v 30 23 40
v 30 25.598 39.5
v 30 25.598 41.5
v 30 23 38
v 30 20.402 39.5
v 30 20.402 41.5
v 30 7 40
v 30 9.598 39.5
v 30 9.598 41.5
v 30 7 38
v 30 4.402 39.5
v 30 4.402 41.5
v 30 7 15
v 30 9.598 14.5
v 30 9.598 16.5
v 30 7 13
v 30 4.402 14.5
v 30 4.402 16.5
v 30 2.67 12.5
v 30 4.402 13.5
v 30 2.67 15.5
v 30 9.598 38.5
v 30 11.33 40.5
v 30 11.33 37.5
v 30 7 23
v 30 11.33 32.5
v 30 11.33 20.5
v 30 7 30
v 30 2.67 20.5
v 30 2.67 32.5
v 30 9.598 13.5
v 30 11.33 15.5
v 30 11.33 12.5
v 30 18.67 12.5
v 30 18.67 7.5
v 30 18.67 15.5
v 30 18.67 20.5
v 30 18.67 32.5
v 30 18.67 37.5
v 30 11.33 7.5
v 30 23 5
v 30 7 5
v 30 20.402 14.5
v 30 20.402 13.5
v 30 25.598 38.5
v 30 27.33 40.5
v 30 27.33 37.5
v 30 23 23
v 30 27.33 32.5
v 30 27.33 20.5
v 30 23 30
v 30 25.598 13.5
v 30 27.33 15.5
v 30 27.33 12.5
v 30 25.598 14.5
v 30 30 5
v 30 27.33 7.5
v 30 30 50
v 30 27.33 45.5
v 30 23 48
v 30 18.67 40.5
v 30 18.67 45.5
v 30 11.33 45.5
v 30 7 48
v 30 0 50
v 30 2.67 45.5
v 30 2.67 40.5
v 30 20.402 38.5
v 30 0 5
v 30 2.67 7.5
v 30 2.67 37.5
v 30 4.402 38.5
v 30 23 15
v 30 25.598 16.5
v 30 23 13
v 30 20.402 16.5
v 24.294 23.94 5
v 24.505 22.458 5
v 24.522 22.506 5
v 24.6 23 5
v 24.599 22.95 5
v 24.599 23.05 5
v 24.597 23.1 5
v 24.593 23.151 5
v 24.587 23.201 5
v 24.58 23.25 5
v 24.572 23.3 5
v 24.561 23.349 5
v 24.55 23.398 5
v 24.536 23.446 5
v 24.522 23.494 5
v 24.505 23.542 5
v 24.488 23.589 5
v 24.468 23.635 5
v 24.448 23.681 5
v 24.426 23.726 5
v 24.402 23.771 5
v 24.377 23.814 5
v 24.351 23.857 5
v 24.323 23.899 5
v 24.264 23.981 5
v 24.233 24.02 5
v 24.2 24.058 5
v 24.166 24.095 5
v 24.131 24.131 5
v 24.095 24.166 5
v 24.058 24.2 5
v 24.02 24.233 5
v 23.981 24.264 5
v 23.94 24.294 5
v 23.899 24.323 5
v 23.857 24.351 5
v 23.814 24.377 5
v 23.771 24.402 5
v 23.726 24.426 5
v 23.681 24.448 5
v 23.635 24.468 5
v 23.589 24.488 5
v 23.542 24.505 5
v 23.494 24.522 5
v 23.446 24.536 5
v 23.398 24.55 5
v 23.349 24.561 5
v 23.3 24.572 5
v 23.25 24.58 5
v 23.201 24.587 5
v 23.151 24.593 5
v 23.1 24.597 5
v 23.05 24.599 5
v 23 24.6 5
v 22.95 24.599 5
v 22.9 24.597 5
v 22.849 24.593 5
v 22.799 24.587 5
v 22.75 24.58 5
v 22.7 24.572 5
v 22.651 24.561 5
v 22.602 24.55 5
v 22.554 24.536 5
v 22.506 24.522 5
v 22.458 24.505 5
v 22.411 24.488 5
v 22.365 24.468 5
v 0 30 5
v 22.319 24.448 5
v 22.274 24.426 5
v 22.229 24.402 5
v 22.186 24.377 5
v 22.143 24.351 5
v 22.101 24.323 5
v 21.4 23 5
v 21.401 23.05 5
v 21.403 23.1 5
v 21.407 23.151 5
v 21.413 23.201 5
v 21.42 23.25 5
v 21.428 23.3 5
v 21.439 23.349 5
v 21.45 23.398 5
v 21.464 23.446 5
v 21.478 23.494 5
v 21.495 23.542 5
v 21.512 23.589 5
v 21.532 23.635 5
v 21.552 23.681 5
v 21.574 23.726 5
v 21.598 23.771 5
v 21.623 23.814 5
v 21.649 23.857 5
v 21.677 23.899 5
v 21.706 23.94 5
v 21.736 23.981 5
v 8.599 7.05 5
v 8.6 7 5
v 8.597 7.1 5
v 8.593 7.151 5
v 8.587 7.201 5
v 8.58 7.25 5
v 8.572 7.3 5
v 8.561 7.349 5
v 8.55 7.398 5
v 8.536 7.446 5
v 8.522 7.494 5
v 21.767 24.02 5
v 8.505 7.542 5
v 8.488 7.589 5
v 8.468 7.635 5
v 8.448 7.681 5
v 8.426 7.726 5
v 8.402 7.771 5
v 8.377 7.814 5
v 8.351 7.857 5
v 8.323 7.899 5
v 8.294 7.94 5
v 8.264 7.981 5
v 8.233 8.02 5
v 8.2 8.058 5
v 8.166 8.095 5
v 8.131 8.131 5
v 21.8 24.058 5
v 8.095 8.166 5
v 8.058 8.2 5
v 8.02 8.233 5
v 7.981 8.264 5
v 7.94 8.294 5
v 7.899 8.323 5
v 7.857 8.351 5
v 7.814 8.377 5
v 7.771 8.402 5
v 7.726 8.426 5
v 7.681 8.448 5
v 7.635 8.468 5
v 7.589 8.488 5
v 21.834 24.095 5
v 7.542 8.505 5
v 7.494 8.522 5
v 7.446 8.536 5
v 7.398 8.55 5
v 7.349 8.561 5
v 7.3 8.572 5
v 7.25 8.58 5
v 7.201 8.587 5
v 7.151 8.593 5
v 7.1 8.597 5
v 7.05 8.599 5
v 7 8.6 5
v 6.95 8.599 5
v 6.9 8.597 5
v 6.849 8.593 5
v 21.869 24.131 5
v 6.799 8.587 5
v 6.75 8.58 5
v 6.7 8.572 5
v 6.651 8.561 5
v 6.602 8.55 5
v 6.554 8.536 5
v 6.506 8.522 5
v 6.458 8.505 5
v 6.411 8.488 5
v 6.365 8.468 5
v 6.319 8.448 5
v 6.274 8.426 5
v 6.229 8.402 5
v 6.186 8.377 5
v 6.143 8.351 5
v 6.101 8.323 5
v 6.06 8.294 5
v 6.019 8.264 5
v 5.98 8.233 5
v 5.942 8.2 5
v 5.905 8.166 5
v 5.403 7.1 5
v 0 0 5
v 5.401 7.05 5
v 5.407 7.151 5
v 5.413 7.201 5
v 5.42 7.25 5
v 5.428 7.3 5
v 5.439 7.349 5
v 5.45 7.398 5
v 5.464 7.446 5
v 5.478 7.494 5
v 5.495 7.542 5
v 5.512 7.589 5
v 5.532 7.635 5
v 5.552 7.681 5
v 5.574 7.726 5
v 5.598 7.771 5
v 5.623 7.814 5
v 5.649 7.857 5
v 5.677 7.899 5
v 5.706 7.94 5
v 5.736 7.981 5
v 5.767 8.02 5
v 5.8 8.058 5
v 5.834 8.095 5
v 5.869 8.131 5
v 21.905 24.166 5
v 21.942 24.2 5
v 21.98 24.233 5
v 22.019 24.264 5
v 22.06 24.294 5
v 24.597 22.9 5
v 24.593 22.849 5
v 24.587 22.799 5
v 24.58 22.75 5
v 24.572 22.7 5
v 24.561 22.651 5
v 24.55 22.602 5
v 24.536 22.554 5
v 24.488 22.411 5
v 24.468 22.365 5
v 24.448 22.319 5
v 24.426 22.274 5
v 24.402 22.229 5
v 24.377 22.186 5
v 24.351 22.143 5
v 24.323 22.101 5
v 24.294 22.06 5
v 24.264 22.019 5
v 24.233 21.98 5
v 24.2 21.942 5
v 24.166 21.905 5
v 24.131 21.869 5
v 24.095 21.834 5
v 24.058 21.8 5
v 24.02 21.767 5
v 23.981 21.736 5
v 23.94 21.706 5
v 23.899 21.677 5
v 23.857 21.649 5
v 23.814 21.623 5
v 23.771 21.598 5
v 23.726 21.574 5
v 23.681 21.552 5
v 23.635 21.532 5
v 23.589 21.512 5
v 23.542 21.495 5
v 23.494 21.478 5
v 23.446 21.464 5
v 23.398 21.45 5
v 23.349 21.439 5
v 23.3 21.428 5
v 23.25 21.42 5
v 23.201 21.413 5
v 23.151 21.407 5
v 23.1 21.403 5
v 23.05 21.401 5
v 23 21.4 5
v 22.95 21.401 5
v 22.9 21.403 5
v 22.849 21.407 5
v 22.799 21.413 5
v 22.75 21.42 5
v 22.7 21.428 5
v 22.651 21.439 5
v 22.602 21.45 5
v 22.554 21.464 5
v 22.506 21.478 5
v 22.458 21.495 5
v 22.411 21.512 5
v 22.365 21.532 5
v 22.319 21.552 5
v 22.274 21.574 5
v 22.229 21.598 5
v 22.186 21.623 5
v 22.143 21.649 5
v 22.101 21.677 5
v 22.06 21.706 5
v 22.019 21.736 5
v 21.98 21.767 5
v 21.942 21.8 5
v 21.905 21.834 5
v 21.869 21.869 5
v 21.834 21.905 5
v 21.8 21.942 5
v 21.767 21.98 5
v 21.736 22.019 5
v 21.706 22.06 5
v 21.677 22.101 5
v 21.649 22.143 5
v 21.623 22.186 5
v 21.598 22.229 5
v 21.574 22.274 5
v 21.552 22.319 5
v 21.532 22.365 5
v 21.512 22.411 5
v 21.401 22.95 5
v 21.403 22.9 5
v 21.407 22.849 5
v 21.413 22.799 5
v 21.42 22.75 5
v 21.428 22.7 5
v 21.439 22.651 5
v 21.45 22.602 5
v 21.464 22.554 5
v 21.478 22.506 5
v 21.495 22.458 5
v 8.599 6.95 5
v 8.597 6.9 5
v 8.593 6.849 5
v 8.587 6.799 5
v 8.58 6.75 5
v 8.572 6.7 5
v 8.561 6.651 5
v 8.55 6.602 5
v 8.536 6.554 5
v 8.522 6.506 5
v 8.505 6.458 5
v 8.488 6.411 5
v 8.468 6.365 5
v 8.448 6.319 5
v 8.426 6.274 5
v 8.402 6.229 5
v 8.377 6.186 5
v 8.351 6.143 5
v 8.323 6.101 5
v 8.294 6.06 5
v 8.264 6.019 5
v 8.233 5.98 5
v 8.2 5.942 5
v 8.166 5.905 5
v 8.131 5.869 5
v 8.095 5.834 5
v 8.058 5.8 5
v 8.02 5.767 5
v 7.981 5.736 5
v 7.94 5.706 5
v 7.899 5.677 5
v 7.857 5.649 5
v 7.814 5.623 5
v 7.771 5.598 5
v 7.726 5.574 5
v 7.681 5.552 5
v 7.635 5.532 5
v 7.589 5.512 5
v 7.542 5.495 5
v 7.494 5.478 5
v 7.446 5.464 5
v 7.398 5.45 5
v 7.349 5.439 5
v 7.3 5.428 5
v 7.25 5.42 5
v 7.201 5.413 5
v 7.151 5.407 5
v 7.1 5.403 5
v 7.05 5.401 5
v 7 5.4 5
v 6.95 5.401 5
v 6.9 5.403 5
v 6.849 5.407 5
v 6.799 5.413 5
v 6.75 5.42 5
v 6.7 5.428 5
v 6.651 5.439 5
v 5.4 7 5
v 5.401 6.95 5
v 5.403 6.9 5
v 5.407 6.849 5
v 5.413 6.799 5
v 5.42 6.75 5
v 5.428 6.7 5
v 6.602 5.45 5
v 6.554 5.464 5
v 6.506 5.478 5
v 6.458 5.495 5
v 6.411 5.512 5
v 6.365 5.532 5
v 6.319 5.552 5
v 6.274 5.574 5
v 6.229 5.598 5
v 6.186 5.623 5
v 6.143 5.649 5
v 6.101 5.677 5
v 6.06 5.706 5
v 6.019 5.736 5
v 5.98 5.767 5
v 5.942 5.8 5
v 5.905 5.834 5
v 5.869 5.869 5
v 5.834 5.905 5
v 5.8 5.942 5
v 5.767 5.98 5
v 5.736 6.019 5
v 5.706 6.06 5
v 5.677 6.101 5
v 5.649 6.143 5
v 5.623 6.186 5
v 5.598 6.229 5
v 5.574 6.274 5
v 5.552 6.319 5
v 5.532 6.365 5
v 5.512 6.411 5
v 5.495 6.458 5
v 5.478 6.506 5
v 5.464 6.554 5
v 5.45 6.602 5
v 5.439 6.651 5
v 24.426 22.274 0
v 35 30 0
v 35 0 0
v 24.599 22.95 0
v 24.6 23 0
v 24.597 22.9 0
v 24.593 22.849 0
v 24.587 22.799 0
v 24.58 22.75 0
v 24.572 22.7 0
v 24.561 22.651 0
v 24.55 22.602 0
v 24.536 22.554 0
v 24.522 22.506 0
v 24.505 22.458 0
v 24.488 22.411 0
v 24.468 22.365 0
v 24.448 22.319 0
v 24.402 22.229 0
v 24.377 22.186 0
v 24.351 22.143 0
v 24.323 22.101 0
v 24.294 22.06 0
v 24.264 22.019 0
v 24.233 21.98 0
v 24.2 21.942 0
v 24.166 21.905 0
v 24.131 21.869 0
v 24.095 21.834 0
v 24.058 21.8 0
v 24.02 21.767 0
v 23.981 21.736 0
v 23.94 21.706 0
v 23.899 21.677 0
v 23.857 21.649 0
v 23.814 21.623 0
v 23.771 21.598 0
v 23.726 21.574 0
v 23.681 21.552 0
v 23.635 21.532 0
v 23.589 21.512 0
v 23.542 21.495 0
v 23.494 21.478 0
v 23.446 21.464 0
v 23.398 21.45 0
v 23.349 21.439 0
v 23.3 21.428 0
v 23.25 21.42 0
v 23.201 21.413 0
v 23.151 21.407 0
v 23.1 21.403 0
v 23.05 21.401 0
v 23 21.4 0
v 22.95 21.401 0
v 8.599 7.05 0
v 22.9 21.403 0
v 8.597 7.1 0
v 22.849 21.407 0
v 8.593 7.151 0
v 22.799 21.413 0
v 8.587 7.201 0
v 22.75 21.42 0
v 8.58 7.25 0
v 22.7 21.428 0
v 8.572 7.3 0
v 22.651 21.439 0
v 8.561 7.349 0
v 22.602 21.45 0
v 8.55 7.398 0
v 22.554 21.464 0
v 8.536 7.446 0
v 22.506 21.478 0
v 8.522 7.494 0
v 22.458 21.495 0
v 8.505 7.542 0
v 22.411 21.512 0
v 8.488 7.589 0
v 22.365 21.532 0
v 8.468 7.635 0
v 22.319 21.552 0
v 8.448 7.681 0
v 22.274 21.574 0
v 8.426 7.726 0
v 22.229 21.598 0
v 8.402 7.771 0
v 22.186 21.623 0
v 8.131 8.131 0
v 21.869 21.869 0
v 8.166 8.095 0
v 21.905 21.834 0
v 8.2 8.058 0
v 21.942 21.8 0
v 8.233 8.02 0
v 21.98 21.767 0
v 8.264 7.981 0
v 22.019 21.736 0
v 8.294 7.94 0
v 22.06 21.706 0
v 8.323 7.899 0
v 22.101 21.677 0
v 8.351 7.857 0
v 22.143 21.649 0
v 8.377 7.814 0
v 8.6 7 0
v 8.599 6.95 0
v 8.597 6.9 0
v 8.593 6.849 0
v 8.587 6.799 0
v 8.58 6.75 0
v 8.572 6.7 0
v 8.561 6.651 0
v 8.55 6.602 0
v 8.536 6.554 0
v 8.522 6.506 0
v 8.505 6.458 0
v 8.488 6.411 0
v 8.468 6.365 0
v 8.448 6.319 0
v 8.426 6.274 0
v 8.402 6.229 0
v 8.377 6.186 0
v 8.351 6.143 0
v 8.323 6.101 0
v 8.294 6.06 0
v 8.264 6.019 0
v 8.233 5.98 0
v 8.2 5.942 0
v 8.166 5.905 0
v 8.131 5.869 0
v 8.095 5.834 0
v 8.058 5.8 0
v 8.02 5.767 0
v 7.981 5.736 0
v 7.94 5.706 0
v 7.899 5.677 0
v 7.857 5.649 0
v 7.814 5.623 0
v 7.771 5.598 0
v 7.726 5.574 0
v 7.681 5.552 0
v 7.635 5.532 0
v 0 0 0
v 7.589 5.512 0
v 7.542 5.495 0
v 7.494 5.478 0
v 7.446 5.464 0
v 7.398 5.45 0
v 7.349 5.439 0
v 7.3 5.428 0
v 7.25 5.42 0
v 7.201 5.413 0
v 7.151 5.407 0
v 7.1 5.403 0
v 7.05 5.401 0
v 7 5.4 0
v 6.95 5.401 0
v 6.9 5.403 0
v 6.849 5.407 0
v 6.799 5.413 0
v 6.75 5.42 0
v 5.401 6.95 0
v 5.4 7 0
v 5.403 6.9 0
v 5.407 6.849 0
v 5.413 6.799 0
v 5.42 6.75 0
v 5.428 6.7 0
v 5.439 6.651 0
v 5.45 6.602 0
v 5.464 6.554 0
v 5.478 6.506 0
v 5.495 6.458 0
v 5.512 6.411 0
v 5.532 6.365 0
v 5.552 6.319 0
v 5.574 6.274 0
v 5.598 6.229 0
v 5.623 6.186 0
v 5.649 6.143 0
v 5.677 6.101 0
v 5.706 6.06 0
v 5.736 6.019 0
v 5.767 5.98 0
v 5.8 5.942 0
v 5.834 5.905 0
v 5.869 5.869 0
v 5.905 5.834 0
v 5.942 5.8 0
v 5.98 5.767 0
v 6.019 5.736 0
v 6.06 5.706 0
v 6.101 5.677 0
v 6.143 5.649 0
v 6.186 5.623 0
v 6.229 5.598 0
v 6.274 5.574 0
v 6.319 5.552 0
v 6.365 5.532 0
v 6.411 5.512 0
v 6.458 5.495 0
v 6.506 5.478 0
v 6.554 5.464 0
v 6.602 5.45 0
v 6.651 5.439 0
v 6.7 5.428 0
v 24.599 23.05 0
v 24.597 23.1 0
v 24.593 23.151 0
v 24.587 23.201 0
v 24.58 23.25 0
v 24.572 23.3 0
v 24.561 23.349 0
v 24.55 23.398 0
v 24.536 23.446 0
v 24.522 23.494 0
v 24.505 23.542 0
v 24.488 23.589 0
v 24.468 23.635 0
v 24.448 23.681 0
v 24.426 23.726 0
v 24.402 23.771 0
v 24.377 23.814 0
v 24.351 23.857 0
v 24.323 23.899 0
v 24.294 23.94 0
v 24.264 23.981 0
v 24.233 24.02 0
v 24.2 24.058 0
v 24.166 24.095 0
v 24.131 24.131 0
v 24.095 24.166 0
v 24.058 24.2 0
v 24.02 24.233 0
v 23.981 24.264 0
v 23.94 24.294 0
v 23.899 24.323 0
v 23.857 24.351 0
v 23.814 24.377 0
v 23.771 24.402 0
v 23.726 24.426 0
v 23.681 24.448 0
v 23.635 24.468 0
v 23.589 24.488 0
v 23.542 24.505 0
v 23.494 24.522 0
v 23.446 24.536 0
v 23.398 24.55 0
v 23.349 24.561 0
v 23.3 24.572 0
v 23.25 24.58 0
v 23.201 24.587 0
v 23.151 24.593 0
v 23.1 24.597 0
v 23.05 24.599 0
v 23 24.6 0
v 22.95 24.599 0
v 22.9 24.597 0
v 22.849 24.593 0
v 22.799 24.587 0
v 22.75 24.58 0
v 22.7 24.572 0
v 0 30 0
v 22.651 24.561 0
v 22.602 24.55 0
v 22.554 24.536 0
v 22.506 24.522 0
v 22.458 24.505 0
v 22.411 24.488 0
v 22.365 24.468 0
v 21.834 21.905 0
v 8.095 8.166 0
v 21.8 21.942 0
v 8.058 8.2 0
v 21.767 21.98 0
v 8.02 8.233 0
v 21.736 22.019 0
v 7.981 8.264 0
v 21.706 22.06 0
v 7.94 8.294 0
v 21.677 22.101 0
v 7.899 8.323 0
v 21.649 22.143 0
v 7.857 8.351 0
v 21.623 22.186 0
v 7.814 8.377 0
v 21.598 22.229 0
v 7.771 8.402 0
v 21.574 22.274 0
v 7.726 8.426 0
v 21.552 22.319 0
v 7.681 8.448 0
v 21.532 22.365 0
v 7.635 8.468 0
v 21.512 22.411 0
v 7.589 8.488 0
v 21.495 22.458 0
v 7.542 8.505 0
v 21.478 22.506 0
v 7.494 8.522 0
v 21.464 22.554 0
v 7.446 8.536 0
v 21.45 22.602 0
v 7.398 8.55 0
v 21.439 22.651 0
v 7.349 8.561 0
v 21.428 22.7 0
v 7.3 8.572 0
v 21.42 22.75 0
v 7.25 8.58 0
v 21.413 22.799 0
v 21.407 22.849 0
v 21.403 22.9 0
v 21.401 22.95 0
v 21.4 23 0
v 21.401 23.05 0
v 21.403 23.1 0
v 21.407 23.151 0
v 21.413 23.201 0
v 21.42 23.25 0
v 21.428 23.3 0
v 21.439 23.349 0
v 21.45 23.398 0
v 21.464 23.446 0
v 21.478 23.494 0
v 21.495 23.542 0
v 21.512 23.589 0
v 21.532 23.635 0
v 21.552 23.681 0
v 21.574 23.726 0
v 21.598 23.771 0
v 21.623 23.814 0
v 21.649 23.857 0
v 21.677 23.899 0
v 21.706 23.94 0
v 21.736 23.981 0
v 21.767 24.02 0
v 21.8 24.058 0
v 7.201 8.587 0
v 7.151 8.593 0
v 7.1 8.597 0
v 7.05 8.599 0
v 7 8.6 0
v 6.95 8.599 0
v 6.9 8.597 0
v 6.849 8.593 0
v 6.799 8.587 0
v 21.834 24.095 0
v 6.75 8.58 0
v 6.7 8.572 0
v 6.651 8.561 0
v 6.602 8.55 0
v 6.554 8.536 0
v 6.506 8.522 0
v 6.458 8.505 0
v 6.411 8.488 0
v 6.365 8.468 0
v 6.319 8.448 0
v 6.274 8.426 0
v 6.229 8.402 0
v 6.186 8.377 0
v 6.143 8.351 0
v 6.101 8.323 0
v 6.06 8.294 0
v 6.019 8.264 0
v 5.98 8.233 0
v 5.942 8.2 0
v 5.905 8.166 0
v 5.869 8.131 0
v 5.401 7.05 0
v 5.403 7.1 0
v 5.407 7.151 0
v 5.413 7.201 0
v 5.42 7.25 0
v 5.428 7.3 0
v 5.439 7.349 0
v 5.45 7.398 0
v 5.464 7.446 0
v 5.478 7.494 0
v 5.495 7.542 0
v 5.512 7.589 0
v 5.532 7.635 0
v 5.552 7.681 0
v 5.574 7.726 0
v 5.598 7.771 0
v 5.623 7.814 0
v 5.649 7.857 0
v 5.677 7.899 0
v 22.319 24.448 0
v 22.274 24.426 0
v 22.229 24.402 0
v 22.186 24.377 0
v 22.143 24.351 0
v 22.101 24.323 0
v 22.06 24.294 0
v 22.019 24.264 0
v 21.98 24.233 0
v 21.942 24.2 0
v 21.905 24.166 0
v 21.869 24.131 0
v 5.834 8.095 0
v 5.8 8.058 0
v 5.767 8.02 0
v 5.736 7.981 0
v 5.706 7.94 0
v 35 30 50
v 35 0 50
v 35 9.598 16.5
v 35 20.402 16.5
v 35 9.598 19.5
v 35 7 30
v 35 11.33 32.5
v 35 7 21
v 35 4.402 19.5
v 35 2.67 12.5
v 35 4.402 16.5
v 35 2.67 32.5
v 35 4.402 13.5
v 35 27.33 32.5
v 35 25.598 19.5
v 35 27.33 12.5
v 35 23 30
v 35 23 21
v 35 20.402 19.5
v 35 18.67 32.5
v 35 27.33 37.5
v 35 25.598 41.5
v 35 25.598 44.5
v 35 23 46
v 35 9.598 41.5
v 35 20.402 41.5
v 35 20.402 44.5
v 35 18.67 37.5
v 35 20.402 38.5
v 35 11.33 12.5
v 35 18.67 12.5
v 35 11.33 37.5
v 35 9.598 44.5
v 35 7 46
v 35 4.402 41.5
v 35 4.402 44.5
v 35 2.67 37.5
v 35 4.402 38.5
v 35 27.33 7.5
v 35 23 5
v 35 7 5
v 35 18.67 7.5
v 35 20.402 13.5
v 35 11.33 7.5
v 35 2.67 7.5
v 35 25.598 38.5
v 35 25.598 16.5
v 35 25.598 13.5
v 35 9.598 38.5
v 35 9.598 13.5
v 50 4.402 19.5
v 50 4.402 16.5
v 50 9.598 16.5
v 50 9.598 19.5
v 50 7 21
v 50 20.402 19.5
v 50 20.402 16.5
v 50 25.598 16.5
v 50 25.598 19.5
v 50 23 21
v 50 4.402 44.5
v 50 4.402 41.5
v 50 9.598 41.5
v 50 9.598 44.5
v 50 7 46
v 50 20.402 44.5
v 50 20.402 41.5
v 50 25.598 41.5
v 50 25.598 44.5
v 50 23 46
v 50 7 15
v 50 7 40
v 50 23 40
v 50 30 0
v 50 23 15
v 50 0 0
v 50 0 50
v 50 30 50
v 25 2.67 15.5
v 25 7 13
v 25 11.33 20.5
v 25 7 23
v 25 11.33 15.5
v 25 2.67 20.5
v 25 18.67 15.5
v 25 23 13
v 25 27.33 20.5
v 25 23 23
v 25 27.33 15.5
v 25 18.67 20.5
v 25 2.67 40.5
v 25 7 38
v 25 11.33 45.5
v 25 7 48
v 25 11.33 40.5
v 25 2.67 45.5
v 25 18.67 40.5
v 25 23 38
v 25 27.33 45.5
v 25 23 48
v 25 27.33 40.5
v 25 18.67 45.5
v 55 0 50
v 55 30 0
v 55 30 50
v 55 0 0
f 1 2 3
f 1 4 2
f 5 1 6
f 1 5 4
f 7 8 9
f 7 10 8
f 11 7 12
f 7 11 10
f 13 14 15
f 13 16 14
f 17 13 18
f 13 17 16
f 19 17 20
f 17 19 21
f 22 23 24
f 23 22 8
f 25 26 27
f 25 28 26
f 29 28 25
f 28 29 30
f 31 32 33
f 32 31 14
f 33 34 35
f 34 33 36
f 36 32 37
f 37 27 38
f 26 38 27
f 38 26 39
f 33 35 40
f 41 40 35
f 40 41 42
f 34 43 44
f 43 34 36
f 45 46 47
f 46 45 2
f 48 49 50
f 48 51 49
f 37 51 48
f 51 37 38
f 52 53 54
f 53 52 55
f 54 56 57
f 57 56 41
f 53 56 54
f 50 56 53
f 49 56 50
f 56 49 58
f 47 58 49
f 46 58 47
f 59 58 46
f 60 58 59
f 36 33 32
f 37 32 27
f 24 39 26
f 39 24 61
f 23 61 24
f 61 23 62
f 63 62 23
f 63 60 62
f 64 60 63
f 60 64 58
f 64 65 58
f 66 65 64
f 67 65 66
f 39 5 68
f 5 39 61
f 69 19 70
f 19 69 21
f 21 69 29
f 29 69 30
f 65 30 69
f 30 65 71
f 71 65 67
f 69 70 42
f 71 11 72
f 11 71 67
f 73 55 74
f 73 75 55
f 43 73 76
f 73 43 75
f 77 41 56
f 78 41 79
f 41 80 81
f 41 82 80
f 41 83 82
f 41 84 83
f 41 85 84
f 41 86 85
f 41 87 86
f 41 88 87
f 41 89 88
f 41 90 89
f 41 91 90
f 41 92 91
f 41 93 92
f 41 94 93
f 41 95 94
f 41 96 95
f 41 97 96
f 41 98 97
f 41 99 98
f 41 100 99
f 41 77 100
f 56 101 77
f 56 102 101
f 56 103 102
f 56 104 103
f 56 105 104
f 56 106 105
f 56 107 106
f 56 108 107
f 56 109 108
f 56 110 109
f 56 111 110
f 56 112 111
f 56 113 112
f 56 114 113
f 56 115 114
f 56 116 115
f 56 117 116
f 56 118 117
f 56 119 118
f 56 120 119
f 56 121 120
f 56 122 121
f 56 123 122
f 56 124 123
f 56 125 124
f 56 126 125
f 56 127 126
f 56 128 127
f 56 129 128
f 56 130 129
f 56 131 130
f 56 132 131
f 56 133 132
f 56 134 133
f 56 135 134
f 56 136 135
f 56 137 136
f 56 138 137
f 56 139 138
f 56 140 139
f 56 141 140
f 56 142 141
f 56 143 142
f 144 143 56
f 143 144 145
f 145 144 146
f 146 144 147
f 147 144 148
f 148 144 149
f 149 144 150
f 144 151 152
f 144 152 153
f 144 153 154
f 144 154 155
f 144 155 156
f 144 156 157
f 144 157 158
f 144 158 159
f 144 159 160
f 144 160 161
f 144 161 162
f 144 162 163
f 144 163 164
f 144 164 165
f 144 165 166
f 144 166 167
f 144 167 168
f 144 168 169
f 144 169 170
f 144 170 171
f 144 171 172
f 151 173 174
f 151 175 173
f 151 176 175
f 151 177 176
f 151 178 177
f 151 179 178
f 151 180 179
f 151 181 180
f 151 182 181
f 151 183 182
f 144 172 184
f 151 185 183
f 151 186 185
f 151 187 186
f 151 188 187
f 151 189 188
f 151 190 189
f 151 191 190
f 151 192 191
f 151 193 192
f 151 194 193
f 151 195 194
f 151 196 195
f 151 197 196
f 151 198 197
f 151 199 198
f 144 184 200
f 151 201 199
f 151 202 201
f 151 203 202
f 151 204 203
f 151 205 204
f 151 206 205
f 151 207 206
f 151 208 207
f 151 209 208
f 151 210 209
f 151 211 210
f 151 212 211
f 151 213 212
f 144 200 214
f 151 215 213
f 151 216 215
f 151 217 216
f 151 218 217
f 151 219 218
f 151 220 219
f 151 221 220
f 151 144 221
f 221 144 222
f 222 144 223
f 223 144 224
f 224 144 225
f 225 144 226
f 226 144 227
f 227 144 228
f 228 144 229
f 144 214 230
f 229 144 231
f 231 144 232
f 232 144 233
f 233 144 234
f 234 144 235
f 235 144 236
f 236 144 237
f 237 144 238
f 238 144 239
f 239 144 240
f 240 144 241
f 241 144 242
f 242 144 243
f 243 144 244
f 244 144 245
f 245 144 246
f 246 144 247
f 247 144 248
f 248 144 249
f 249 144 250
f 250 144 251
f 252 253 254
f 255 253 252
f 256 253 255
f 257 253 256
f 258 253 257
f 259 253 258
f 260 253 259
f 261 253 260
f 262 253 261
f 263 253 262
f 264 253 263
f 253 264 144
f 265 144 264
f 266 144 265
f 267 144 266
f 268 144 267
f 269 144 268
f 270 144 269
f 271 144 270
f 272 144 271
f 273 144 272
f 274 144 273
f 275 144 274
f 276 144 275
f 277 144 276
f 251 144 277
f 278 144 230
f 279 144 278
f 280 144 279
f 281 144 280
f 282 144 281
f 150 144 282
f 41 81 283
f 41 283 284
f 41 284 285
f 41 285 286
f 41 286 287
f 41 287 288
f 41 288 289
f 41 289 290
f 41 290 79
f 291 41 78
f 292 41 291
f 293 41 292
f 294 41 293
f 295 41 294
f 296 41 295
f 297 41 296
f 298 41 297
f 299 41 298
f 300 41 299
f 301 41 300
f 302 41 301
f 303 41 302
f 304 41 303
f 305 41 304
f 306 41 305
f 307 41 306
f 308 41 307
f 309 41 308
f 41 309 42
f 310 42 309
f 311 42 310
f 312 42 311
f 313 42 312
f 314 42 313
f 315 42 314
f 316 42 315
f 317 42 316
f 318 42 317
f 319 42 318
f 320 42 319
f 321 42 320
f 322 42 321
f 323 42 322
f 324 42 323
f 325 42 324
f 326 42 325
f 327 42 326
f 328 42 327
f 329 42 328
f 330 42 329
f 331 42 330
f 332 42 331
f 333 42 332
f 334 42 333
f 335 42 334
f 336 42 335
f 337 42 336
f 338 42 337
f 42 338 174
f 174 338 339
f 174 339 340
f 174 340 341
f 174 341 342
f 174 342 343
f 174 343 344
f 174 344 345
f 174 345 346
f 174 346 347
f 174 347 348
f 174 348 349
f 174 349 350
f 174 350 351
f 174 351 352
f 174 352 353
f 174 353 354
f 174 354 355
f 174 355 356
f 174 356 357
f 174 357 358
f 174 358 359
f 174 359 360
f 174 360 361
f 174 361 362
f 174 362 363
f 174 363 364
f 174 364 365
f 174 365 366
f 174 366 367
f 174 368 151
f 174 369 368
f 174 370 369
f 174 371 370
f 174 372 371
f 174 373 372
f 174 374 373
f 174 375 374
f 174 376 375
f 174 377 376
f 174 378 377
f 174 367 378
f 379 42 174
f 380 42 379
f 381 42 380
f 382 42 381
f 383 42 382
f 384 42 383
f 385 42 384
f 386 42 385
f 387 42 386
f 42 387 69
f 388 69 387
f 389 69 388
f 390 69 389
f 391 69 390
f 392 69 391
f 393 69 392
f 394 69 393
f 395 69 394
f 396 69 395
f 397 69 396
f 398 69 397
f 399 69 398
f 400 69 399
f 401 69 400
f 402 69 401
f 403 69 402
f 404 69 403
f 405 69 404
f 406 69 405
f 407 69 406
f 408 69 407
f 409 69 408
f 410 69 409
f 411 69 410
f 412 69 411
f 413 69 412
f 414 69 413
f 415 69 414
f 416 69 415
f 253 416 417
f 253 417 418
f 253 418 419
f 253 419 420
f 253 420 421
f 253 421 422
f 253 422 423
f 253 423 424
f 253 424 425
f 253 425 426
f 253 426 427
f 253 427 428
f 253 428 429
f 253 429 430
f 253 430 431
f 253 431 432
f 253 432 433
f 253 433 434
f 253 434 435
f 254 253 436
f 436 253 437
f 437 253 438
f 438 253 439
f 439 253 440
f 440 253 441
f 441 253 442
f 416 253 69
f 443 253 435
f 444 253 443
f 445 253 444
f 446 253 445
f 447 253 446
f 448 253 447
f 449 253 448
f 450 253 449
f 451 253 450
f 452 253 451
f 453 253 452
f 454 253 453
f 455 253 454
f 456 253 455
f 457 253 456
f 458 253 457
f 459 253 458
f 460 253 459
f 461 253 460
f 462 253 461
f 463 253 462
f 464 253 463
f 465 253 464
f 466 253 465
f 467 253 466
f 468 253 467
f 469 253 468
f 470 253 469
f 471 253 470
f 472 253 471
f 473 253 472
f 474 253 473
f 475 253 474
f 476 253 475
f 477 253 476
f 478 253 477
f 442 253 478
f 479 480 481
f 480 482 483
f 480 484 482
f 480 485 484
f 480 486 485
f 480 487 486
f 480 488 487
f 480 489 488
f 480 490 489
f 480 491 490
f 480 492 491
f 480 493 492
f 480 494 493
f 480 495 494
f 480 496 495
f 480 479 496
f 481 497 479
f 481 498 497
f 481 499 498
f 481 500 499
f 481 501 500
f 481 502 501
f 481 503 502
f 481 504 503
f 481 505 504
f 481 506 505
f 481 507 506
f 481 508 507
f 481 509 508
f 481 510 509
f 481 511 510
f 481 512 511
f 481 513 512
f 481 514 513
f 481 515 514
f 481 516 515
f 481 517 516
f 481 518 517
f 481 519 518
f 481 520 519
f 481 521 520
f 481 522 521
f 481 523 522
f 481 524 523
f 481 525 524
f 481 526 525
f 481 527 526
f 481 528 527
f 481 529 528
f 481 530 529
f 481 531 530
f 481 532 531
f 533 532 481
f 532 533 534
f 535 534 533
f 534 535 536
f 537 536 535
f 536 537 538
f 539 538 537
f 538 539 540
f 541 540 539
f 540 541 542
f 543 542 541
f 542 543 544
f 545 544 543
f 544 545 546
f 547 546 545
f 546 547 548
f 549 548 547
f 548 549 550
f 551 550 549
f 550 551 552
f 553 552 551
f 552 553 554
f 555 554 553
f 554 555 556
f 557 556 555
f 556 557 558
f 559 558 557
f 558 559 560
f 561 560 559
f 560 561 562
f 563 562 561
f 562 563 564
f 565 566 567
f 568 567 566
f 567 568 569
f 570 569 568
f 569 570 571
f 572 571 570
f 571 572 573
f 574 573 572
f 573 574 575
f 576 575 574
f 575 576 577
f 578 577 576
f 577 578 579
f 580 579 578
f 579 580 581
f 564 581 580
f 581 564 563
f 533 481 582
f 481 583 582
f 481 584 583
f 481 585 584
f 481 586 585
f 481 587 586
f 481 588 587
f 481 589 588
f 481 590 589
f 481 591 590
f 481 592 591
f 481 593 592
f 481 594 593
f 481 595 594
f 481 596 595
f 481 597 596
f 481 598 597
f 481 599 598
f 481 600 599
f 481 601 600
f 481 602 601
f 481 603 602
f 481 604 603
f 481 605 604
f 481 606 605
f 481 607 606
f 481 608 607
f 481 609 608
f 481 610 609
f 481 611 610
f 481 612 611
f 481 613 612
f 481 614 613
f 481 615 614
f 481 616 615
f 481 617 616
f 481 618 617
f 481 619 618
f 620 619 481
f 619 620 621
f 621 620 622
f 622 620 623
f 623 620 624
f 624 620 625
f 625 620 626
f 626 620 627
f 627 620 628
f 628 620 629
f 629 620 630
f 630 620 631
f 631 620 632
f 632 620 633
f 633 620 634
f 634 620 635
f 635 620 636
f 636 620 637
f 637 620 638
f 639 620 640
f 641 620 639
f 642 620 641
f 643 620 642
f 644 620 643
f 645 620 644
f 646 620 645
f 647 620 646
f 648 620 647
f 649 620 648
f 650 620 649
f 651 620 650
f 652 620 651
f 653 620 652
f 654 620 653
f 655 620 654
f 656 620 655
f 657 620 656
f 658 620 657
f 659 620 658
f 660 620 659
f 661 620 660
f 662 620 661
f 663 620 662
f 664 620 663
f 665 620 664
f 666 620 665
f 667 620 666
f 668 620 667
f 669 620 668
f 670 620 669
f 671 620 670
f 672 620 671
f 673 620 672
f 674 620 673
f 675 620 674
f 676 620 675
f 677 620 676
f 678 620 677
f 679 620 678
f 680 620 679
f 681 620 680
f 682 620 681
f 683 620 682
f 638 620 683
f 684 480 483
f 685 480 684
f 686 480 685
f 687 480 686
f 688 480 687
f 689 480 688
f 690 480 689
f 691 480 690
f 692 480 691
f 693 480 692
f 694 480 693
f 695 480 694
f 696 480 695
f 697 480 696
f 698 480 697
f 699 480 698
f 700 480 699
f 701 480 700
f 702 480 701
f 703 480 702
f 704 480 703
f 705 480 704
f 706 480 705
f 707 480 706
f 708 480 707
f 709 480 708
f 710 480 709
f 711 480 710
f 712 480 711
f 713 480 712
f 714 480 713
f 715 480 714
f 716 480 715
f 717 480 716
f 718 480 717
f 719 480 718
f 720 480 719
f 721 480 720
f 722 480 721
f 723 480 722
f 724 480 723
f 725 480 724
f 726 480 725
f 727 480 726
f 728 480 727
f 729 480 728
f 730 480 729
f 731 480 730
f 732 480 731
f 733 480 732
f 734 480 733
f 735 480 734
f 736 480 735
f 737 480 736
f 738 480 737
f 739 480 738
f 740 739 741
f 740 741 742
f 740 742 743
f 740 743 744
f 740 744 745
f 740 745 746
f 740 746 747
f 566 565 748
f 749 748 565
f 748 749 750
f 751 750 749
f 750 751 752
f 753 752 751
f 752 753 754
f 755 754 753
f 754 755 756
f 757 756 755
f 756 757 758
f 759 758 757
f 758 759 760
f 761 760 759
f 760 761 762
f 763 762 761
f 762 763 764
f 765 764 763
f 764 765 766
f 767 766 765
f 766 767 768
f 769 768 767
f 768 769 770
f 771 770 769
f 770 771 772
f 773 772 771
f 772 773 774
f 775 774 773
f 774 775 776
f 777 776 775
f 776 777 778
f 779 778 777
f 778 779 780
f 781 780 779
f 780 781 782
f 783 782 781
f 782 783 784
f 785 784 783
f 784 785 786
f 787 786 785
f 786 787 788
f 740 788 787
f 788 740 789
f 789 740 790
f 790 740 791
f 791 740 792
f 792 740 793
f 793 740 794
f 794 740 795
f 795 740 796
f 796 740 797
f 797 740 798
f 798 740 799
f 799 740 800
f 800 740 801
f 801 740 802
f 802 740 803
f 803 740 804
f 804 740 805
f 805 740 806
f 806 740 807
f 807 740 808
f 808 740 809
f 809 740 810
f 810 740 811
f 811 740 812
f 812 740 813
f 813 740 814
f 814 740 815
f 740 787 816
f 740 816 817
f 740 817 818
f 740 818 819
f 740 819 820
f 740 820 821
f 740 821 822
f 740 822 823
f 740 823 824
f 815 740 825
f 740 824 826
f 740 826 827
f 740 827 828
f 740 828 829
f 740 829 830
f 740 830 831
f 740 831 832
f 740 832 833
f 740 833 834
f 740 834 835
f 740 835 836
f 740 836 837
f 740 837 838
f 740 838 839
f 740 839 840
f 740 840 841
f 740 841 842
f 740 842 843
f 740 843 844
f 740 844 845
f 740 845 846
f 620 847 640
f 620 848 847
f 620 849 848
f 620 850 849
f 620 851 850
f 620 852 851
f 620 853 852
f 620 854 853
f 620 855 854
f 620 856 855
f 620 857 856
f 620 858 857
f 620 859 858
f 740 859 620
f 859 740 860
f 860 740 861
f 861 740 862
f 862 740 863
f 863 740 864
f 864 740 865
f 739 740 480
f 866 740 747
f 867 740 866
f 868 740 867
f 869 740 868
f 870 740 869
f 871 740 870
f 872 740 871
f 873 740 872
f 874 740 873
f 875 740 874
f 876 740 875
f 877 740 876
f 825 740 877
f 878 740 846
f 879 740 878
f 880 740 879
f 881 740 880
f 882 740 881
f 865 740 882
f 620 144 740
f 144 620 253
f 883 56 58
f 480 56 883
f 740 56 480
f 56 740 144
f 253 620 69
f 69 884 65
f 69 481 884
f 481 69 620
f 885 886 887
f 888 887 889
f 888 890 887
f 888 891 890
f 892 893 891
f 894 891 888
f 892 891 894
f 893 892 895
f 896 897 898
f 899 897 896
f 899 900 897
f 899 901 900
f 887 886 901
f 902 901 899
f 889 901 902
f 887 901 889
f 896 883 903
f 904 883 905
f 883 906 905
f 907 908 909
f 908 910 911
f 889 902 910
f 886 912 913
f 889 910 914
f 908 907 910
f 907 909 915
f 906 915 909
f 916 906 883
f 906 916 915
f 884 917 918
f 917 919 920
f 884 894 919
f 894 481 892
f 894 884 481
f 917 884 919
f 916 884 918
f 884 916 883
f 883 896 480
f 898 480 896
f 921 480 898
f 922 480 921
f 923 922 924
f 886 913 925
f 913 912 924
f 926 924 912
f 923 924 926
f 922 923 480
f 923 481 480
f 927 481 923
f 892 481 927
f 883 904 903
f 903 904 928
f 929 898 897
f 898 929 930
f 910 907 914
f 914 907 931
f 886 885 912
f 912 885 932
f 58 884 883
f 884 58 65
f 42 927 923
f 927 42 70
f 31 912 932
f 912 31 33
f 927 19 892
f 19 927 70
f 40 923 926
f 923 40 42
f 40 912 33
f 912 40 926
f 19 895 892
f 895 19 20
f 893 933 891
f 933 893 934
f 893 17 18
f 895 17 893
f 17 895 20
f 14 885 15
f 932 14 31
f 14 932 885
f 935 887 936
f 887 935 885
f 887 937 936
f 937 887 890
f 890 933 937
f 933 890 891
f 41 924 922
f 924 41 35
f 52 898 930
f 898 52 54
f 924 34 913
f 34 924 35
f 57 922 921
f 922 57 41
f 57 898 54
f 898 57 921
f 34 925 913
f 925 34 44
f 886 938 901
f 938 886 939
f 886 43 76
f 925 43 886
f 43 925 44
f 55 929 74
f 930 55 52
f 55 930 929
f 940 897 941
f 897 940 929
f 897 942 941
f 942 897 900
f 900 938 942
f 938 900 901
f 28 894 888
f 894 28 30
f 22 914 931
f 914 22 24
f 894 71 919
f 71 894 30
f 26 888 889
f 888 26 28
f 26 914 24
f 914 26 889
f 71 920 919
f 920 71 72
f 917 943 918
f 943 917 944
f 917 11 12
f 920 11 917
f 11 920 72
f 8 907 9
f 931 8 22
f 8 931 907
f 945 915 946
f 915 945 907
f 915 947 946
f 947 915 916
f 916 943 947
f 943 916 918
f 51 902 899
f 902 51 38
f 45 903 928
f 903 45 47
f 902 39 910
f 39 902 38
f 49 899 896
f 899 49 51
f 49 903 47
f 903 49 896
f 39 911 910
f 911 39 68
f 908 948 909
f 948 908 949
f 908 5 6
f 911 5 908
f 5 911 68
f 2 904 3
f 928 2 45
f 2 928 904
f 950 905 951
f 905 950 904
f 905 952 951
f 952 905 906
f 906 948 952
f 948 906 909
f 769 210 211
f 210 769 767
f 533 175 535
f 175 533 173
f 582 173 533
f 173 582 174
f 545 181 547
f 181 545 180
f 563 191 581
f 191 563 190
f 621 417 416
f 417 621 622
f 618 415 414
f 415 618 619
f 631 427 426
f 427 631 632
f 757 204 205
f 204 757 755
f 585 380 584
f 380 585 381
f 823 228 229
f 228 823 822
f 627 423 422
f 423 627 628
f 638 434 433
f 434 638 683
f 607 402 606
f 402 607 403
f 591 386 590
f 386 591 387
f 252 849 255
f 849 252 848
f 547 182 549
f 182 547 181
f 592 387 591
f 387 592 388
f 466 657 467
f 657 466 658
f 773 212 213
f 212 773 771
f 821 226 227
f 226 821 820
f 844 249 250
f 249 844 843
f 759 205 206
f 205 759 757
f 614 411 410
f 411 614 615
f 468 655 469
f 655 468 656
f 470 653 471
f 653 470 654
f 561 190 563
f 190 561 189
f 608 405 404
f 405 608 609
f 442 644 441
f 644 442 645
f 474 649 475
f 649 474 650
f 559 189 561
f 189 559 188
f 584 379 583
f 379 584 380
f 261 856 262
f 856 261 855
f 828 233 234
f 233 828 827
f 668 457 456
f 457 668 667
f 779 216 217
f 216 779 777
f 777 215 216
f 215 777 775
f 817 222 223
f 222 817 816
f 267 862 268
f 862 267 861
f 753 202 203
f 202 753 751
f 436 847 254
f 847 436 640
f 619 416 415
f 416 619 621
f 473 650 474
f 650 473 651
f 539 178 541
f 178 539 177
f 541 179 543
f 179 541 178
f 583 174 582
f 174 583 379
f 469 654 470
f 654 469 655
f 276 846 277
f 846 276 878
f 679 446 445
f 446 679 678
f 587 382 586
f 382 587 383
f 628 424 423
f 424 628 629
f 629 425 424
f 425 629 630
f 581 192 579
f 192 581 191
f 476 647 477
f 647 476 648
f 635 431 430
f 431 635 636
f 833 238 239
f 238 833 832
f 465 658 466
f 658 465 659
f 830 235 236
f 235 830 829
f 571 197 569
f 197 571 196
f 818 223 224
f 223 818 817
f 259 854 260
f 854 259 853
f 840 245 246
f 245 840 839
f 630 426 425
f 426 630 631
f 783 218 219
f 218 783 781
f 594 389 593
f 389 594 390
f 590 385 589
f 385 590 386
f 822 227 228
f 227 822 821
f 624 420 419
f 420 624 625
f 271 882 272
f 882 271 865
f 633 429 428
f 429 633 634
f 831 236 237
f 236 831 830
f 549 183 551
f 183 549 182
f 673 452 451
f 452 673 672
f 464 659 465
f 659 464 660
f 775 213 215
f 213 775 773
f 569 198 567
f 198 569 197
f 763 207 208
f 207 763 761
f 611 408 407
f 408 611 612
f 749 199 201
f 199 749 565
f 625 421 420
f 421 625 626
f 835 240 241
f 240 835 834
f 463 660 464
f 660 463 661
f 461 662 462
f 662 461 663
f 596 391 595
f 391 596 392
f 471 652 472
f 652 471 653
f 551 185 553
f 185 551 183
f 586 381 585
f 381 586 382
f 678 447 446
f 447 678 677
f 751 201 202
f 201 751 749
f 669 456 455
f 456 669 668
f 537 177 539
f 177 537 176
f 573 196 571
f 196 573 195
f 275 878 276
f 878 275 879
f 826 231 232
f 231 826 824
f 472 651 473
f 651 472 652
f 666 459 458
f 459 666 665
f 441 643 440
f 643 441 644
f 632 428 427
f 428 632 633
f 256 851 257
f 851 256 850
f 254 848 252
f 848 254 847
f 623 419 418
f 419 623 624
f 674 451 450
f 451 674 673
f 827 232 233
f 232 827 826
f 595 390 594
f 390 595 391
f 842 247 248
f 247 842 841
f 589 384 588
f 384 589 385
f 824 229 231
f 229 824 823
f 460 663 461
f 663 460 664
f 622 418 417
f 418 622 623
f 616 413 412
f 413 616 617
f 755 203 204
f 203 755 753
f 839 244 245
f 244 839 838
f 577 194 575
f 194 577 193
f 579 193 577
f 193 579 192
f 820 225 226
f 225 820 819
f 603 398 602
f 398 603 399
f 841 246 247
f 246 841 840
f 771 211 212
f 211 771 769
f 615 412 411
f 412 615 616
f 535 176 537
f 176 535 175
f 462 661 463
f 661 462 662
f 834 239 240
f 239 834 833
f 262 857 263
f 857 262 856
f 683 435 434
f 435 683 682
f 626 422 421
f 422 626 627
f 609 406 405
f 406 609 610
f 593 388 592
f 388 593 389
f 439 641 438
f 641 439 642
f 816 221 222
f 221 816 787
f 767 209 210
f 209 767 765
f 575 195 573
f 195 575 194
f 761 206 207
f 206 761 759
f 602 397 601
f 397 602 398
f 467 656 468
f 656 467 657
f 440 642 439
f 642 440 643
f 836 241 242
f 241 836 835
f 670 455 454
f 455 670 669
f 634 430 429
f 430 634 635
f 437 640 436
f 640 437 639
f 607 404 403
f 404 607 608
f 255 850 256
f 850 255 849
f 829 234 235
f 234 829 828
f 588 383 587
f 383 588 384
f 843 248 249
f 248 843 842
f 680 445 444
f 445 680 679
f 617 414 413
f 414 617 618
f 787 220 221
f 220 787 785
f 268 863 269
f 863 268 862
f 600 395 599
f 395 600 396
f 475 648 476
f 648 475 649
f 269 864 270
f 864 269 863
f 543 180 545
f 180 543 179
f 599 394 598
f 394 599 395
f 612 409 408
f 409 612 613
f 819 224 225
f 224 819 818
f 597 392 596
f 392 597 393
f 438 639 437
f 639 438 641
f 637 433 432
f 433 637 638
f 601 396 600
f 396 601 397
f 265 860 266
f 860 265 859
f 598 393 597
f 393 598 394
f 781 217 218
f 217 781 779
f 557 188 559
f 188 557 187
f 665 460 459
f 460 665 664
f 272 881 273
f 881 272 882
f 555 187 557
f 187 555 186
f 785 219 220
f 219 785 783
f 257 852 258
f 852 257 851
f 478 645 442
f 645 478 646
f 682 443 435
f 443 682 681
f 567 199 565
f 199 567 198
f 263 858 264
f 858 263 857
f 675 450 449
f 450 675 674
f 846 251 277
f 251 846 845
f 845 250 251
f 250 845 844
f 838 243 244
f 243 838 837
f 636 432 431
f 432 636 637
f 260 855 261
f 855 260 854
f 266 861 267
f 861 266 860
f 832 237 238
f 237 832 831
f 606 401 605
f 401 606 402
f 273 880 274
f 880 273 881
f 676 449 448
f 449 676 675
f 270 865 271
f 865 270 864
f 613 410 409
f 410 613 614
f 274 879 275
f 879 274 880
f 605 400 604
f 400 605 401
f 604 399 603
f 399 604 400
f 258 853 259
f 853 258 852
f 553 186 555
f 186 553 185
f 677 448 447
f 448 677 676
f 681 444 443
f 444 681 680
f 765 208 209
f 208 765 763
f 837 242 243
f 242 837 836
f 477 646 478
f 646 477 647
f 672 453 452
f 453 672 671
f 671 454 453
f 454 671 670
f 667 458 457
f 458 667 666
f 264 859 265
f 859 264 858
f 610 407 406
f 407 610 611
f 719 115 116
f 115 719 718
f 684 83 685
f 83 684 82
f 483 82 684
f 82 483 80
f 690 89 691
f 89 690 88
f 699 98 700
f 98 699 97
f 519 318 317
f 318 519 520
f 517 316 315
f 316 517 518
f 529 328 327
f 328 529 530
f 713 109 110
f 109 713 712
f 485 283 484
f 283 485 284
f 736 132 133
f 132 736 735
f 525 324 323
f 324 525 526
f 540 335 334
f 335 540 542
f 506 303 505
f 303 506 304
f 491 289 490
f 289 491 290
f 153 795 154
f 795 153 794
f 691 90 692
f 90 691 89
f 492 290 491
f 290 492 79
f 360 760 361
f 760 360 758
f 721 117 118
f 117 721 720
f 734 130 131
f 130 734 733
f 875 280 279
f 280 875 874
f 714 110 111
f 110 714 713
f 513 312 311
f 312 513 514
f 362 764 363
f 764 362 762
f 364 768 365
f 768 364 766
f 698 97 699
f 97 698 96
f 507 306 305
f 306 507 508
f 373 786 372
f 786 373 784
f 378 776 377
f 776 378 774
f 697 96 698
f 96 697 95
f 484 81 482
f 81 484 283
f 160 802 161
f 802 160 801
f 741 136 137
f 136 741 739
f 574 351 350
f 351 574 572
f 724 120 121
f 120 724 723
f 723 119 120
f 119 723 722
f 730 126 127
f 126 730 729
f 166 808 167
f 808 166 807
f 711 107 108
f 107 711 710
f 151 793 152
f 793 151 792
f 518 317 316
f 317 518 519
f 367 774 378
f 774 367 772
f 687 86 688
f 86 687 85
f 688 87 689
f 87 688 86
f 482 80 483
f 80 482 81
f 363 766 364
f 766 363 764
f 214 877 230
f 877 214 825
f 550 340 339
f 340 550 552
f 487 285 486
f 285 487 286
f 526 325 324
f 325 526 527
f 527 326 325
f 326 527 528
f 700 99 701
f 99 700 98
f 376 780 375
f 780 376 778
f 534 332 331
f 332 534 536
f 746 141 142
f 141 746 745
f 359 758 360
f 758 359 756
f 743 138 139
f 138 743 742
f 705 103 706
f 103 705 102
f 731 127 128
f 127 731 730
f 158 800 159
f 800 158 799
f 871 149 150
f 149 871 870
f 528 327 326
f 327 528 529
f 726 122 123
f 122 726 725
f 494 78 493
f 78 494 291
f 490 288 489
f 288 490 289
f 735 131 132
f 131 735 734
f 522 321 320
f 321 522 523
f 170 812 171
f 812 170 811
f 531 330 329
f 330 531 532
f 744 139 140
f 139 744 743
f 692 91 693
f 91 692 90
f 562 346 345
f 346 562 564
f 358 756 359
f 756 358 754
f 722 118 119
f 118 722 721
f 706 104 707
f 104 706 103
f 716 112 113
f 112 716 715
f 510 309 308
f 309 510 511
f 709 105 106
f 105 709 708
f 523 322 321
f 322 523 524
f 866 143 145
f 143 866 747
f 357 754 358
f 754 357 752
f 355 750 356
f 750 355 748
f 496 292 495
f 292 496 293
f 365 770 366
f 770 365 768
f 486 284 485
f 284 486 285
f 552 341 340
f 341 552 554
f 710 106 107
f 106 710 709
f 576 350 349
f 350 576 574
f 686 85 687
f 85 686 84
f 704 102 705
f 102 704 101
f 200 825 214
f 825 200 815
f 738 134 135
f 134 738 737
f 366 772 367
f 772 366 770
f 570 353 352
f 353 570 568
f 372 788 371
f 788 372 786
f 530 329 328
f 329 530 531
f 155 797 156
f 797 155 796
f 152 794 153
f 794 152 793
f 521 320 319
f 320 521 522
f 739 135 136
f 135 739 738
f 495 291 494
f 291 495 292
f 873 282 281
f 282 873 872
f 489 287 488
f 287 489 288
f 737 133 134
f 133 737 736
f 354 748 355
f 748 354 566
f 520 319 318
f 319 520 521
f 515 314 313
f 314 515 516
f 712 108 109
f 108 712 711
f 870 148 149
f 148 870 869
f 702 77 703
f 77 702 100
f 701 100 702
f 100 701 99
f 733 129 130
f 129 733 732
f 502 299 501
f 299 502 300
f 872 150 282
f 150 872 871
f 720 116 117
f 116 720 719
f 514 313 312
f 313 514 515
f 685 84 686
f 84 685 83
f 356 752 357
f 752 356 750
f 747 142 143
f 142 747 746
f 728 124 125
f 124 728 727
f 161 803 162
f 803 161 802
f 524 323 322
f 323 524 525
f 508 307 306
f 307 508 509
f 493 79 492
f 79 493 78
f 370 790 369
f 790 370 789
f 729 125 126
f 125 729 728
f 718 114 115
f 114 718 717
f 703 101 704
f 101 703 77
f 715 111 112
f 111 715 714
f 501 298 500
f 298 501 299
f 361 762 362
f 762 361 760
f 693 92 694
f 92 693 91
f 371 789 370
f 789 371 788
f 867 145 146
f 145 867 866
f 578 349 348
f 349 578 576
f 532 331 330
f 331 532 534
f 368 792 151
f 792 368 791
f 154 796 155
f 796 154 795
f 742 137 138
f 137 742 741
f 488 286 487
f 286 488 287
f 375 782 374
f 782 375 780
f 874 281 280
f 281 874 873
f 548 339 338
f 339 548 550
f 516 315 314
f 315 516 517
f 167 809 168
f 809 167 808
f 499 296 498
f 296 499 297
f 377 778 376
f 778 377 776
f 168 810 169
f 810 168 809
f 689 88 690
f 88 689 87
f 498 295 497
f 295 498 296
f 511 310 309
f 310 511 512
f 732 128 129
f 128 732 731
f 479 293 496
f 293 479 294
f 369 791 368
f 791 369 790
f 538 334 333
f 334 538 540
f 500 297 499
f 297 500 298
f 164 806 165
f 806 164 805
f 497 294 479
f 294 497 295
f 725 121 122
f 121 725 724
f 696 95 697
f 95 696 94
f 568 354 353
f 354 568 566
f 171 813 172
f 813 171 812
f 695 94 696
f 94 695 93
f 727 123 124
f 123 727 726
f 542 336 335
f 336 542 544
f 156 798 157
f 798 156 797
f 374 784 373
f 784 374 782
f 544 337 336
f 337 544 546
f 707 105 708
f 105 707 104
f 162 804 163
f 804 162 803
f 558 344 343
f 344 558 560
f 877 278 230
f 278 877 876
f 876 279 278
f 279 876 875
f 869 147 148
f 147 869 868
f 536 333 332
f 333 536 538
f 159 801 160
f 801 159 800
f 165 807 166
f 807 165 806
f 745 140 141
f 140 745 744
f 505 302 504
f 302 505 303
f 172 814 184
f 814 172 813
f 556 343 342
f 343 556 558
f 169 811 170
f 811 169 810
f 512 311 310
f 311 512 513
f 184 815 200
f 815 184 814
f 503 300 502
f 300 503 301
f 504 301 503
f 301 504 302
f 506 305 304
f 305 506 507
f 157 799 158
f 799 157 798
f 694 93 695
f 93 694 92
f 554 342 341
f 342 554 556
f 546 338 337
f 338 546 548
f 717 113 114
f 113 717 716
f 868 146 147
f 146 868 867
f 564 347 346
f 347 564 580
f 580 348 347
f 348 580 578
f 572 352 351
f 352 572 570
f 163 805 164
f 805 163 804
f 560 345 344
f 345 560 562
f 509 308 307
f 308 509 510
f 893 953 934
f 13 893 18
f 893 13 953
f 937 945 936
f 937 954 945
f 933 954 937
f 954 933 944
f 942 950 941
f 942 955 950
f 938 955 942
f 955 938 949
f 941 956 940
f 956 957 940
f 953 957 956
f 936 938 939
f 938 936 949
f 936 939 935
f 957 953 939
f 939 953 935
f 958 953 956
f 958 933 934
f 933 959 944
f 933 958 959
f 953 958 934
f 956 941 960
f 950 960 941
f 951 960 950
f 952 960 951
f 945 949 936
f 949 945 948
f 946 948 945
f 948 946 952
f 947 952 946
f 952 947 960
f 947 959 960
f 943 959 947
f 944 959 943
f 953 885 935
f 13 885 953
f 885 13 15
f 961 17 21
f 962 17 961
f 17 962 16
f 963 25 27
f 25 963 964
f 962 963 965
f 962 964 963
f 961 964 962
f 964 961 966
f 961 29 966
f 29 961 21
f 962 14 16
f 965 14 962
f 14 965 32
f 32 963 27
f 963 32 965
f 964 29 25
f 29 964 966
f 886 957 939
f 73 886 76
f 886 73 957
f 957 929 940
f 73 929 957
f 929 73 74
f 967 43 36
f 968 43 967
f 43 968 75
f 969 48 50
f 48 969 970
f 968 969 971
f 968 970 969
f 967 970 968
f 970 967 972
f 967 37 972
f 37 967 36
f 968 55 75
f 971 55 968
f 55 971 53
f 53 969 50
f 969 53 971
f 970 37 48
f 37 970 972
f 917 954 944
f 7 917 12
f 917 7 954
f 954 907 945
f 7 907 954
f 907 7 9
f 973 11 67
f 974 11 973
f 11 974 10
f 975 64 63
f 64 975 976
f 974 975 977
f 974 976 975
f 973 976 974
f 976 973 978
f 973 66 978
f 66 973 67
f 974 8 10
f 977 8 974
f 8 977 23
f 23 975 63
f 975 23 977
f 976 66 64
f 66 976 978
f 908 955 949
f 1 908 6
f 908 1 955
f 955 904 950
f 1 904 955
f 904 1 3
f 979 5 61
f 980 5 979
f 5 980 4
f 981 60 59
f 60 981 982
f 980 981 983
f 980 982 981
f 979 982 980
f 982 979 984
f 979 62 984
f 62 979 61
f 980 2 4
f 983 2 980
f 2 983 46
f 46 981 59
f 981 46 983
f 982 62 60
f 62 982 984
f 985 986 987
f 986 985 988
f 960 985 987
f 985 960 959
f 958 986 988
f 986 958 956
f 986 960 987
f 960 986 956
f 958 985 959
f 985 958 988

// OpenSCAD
module loch(){
        // führungslöcher
        rotate([0,90,0])
        cylinder(r=5, h=15, $fn=6);
    
        translate([0,0,5])
        rotate([0,90,0])
        cylinder(r=3,h=15, $fn=6);
    
        translate([0,0,8])
        rotate([0,90,0])
        cylinder(r=3,h=15, $fn=6);    
}
   
module base(){
    difference(){
        union(){
            cube([30, 30,5]);
            translate([30,0,0])
            cube([5,30,50]);
        }
        
        translate([25,7,10])
        loch();
        
        translate([25,23,10])
        loch();
        
        translate([25,7,35])
        loch();
        
        translate([25,23,35])
        loch();
        
        // schraublöcher
        translate([7,7,-1])
        cylinder(r=1.6, h=15, $fn=200);
        
        translate([30-7,30-7,-1])
        cylinder(r=1.6, h=15, $fn=200);        
    }
}

module stange(){
    rotate([0,90,0])
    cylinder(r=3, h=20, $fn=6);
    
    translate([-5,0,0])
    rotate([0,90,0])
    cylinder(r=5, h=5, $fn=6);
}

module bumper(){
    union(){
        translate([50,0,0])
        cube([5,30,50]);
        
        translate([30,7,18])
        stange();
        
        translate([30,23,18])
        stange();
        
        translate([30,7,43])
        stange();

        translate([30,23,43])
        stange();        
    }
}

base();
bumper();
